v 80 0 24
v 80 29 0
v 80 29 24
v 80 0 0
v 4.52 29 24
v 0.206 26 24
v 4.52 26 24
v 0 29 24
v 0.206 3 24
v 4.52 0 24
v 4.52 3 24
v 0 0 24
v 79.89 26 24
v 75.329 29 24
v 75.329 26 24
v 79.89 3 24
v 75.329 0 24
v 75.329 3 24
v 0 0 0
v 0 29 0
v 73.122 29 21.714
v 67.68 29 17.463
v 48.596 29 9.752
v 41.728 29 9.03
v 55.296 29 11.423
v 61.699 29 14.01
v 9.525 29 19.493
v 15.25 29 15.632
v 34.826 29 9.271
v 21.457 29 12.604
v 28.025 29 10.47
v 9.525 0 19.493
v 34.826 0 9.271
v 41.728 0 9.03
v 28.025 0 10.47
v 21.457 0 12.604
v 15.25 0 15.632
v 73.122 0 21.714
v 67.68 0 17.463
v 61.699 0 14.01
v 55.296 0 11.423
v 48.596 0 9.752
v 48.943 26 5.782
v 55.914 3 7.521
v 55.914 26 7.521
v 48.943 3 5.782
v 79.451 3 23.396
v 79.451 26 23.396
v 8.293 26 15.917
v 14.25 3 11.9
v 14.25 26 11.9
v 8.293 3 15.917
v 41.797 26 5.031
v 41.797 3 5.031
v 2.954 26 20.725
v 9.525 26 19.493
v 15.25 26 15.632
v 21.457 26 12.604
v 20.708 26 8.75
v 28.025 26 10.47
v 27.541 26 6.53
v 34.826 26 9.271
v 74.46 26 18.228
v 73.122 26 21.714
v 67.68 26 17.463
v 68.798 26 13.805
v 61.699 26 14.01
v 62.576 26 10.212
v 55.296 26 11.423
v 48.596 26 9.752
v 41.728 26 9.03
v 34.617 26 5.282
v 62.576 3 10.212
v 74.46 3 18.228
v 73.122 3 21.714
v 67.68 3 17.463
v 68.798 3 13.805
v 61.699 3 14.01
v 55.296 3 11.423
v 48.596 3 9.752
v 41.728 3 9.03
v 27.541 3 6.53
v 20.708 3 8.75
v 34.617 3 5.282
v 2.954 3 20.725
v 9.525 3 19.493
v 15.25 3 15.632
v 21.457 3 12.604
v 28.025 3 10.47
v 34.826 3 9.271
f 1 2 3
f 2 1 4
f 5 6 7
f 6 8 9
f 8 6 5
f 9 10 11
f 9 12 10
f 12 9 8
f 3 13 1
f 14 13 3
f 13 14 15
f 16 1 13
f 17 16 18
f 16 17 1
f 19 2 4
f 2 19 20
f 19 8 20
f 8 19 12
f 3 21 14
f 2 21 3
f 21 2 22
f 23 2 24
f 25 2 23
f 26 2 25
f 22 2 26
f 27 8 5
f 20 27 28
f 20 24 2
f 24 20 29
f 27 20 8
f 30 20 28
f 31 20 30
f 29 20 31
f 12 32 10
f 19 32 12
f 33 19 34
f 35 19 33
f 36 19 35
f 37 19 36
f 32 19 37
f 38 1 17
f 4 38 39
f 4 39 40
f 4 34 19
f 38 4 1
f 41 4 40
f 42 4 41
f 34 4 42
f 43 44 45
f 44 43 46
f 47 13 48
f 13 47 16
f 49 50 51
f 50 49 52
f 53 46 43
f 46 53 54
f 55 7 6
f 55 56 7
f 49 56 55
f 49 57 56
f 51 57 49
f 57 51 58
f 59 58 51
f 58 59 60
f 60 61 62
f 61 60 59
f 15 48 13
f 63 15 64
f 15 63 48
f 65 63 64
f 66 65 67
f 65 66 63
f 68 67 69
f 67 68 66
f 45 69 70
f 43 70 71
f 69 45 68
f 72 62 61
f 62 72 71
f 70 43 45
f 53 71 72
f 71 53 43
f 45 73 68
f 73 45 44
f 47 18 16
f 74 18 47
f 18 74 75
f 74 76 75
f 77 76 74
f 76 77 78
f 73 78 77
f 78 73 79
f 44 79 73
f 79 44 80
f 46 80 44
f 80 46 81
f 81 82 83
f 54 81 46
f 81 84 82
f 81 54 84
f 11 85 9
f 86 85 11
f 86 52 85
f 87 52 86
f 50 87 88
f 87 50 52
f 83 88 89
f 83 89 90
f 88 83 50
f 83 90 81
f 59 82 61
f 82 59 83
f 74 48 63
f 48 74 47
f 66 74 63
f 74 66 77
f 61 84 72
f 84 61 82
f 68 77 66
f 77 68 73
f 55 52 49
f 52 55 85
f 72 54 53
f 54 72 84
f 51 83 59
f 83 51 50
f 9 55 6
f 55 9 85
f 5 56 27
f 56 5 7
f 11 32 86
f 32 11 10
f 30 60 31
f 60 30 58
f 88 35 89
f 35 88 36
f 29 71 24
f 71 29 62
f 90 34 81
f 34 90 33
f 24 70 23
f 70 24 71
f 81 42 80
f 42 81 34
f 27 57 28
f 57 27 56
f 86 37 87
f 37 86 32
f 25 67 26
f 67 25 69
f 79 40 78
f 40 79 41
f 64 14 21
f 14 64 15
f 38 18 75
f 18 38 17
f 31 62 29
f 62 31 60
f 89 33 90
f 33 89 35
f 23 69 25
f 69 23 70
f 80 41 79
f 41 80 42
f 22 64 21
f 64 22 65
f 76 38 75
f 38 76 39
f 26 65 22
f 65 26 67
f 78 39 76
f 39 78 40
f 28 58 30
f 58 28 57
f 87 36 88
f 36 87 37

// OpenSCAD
$fn=45;

difference() {
    // the main block
    cube([80, 23+2*3, 24]);
    // main space for award
    translate([80/2, 3, 103/2+5]) rotate([-90, 0, 0]) cylinder(h=23, d=103);
    // surround
    translate([80/2, -0.01, 103/2+7]) rotate([-90, 0, 0]) cylinder(h=23+3.01*2, d=103-4);
}
